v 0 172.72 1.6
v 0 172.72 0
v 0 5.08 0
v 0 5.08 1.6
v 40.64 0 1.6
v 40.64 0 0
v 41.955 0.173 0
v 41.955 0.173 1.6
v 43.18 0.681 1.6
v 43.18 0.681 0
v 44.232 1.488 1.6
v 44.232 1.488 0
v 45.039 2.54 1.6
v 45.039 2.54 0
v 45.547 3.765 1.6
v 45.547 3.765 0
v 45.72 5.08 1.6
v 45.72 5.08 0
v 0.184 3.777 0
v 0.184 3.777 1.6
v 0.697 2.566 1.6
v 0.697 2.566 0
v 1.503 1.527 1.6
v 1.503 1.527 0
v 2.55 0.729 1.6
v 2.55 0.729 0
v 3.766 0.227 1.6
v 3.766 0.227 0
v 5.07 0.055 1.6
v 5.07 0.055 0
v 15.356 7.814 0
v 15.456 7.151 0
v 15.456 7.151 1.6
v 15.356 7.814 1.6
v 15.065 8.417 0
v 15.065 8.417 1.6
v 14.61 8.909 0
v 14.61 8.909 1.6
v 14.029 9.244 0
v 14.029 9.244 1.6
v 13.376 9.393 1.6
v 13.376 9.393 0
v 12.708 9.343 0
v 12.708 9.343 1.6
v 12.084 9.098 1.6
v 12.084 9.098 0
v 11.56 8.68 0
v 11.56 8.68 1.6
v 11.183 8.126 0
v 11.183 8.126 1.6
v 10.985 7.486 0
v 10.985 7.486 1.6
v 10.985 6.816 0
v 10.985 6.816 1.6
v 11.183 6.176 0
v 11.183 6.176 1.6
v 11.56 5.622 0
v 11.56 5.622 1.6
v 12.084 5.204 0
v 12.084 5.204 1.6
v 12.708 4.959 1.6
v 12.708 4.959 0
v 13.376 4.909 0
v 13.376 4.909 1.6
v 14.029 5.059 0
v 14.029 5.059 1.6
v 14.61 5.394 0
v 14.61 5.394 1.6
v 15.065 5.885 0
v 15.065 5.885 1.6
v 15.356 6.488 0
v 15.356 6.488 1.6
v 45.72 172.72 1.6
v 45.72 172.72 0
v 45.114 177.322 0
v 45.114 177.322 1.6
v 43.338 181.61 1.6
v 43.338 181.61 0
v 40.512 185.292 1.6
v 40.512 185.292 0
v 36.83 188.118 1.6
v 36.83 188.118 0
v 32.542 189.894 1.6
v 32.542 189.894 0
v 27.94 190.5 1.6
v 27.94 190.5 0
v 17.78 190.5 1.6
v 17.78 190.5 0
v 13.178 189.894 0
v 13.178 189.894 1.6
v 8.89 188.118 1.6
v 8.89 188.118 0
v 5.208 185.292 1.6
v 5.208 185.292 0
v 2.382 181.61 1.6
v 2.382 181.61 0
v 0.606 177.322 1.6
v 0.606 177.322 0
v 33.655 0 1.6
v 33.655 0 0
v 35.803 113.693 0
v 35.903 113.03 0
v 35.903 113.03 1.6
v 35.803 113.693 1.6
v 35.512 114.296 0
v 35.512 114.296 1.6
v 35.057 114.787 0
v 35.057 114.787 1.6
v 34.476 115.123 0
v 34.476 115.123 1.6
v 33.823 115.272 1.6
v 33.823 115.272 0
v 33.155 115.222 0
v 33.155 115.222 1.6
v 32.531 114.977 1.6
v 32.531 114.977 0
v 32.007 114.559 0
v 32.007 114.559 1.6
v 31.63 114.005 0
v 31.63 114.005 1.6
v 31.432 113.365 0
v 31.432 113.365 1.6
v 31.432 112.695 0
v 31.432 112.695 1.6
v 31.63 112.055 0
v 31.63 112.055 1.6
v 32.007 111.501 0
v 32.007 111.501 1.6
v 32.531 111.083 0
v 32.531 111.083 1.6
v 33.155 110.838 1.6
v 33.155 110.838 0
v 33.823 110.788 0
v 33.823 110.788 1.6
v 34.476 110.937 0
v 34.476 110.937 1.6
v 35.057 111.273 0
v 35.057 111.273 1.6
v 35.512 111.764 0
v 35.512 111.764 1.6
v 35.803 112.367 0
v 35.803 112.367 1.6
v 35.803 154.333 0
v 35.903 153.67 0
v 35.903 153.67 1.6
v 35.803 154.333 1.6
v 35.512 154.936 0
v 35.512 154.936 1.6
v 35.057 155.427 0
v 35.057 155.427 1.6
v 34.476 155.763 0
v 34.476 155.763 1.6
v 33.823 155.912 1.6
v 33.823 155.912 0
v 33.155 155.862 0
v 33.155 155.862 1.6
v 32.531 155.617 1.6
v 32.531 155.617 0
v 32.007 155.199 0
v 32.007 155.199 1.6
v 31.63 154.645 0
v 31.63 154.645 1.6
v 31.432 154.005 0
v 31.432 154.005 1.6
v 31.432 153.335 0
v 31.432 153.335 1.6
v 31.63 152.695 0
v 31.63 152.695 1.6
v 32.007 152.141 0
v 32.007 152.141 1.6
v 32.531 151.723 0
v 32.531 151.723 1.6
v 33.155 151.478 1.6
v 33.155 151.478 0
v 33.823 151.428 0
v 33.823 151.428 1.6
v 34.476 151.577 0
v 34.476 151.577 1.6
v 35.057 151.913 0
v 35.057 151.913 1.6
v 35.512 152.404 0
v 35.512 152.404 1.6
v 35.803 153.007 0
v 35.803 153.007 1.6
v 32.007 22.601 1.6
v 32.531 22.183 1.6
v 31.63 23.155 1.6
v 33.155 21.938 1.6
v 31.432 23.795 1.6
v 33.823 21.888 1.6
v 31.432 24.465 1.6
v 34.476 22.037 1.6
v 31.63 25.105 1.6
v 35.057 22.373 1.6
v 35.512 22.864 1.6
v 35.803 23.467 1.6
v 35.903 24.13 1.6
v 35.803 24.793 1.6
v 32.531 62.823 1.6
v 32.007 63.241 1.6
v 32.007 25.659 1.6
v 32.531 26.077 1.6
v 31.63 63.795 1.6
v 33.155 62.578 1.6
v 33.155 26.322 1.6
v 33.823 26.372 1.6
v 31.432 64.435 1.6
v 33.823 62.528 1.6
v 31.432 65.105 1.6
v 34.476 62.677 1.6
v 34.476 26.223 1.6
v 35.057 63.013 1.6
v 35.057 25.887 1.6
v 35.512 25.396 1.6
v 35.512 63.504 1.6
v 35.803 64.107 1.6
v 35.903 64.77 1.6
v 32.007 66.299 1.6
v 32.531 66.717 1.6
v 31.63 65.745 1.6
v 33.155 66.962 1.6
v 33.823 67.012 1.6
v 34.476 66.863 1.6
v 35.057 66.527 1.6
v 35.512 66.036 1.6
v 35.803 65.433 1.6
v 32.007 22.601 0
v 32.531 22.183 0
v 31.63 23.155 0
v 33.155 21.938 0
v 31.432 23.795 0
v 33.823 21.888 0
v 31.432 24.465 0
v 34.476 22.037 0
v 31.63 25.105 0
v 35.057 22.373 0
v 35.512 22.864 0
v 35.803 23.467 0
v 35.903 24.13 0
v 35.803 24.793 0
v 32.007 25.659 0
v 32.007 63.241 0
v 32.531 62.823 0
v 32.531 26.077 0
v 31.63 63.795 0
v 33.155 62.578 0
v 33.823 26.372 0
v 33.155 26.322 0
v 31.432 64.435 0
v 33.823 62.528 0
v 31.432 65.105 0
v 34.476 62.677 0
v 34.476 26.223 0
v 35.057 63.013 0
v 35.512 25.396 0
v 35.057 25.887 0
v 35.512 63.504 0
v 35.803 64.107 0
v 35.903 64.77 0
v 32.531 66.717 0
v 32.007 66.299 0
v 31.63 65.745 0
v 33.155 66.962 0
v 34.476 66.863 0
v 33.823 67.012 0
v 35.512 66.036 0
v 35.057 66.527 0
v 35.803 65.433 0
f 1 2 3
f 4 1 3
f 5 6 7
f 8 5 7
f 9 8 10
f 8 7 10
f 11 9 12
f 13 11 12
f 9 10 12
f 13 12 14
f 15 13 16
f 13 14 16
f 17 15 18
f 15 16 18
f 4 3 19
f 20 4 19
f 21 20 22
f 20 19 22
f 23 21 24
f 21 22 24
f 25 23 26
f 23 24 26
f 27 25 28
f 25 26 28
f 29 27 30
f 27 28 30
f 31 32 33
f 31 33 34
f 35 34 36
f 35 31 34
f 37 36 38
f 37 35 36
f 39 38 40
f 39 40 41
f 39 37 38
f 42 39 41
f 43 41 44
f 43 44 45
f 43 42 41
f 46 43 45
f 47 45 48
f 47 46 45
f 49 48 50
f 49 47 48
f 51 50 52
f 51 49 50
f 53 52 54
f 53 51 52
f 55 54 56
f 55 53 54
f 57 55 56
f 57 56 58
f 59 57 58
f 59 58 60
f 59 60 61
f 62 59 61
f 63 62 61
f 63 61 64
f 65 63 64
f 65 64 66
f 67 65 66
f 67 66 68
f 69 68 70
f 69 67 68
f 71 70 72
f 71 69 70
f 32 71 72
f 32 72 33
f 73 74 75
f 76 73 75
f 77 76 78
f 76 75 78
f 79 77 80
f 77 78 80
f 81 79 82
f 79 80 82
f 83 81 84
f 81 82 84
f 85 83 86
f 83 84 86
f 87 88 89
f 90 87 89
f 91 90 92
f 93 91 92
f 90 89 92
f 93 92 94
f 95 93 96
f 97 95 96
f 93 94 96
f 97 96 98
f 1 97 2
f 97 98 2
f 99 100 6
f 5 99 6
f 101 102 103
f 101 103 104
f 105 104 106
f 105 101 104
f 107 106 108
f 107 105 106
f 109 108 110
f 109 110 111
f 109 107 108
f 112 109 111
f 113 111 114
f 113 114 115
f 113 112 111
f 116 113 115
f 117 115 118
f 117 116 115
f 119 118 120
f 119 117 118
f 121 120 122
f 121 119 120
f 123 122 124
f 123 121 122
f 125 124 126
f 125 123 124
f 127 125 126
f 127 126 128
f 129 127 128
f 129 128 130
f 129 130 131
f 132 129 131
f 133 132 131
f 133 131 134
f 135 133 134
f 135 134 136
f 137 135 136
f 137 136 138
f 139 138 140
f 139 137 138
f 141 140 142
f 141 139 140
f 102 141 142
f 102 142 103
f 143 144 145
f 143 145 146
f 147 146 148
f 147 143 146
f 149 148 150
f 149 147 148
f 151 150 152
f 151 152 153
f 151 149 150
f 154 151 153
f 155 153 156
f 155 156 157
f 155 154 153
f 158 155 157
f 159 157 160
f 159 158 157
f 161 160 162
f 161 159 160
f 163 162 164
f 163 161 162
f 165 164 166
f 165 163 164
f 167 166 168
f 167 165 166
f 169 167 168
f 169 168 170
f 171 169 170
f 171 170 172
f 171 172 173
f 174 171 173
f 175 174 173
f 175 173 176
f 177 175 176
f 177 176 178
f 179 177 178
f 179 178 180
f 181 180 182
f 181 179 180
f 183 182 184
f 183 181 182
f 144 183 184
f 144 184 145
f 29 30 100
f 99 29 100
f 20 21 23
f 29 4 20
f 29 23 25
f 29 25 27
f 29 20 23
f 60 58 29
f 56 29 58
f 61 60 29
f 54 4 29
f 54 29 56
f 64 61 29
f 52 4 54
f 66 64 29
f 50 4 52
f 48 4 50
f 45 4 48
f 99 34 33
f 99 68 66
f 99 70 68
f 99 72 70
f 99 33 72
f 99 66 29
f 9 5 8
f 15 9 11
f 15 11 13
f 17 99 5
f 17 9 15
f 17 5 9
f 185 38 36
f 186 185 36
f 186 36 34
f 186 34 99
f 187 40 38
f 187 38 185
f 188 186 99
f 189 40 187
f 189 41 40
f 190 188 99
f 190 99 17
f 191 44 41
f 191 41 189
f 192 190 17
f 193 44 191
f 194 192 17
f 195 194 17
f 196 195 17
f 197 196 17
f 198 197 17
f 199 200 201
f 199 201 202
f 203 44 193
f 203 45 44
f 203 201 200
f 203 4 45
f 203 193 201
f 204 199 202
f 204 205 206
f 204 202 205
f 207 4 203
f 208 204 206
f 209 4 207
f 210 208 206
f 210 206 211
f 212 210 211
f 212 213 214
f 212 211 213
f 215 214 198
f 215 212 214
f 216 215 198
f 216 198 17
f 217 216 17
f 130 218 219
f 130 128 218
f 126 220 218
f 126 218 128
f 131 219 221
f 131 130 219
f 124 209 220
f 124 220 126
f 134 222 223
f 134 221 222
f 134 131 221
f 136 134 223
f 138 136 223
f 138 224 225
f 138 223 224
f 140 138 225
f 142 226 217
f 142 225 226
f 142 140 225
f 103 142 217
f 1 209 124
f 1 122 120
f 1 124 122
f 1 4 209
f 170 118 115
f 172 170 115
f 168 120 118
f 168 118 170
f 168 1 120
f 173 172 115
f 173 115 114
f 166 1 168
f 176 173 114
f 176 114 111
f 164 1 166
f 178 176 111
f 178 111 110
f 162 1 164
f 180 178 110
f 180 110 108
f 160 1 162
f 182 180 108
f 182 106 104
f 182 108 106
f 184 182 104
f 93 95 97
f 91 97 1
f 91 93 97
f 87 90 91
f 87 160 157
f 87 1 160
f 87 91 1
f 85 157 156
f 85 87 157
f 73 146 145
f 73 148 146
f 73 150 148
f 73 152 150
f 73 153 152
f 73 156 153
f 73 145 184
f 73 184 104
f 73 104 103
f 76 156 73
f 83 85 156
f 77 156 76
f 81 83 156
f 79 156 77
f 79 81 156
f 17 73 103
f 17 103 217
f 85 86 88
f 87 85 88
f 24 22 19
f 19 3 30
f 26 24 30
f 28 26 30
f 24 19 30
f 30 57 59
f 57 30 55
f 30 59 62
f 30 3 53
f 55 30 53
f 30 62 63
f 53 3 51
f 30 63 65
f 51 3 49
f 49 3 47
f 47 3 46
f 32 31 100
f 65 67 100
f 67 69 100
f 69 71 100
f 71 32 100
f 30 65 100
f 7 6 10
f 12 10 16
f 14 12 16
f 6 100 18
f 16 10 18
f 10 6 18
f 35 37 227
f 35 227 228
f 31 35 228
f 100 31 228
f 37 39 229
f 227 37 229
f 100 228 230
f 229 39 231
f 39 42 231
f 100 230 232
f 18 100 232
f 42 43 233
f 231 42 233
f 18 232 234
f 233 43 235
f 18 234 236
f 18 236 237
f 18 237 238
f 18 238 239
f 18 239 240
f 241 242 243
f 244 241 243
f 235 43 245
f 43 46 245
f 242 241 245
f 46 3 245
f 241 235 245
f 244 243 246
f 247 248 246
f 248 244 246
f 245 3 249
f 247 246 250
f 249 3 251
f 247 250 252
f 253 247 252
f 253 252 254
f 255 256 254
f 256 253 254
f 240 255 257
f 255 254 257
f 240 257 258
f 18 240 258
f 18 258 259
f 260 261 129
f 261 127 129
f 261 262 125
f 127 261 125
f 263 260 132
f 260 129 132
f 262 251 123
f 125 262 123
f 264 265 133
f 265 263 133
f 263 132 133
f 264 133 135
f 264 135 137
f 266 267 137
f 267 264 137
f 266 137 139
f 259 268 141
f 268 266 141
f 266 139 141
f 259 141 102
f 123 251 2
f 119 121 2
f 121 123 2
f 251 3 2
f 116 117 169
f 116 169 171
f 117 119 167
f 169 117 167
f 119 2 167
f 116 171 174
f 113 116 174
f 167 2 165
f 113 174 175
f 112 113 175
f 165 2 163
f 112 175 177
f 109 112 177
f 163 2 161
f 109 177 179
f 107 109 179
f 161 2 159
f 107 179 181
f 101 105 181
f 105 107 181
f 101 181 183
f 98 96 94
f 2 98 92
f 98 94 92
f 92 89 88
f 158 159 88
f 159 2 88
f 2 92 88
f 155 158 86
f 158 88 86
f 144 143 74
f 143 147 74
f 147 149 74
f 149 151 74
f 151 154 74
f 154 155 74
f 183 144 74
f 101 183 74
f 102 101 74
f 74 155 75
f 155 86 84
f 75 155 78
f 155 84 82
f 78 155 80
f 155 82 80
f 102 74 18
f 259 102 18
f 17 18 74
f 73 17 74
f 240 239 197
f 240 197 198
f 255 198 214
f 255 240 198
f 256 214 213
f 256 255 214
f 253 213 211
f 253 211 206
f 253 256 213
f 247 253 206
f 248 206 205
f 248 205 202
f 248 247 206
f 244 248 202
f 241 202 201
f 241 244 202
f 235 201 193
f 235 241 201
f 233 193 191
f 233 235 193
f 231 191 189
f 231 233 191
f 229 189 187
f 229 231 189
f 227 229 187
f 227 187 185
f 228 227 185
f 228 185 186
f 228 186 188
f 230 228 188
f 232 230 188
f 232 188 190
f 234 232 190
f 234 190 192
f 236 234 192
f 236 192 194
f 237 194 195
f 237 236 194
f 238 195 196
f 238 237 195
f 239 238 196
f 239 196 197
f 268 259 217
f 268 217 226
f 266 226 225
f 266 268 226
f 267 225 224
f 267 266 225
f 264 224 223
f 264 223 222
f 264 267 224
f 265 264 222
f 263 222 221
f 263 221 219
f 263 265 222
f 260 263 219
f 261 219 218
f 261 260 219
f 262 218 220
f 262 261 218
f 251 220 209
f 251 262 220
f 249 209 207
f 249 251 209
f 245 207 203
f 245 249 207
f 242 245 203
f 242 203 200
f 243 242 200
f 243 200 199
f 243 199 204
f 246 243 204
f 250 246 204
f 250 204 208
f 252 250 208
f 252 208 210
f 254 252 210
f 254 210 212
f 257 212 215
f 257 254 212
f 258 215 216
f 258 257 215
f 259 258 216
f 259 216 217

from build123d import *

# Parameters (mm, degrees)
SKETCH1_R           = 2.2479
BOSS_EXTRUDE2_DEPTH = 1.6002


with BuildPart() as part:
    # Sketch1 → Boss-Extrude2 (new body)
    with BuildSketch(Plane.XY):
        with BuildLine():
            Line((45.72, 5.08), (45.72, 172.72))
            ThreePointArc((45.72, 172.72), (40.512358569, 185.292358569), (27.94, 190.5))
            Line((27.94, 190.5), (17.78, 190.5))
            ThreePointArc((17.78, 190.5), (5.207641431, 185.292358569), (0, 172.72))
            Line((0, 172.72), (0, 5.08))
            ThreePointArc((0, 5.08), (1.503493452, 1.526611814), (5.070014314, 0.054542149))
            Line((5.070014314, 0.054542149), (33.655, 0))
            Line((33.655, 0), (40.64, 0))
            ThreePointArc((40.64, 0), (44.232102448, 1.487897552), (45.72, 5.08))
        make_face()
        with Locations((33.655, 24.13)):
            Circle(SKETCH1_R, mode=Mode.SUBTRACT)
        with Locations((33.655, 64.77)):
            Circle(SKETCH1_R, mode=Mode.SUBTRACT)
        with Locations((33.655, 113.03)):
            Circle(SKETCH1_R, mode=Mode.SUBTRACT)
        with Locations((33.655, 153.67)):
            Circle(SKETCH1_R, mode=Mode.SUBTRACT)
        with Locations((13.208, 7.15102725)):
            Circle(SKETCH1_R, mode=Mode.SUBTRACT)
    extrude(amount=BOSS_EXTRUDE2_DEPTH)


solid = part.part
